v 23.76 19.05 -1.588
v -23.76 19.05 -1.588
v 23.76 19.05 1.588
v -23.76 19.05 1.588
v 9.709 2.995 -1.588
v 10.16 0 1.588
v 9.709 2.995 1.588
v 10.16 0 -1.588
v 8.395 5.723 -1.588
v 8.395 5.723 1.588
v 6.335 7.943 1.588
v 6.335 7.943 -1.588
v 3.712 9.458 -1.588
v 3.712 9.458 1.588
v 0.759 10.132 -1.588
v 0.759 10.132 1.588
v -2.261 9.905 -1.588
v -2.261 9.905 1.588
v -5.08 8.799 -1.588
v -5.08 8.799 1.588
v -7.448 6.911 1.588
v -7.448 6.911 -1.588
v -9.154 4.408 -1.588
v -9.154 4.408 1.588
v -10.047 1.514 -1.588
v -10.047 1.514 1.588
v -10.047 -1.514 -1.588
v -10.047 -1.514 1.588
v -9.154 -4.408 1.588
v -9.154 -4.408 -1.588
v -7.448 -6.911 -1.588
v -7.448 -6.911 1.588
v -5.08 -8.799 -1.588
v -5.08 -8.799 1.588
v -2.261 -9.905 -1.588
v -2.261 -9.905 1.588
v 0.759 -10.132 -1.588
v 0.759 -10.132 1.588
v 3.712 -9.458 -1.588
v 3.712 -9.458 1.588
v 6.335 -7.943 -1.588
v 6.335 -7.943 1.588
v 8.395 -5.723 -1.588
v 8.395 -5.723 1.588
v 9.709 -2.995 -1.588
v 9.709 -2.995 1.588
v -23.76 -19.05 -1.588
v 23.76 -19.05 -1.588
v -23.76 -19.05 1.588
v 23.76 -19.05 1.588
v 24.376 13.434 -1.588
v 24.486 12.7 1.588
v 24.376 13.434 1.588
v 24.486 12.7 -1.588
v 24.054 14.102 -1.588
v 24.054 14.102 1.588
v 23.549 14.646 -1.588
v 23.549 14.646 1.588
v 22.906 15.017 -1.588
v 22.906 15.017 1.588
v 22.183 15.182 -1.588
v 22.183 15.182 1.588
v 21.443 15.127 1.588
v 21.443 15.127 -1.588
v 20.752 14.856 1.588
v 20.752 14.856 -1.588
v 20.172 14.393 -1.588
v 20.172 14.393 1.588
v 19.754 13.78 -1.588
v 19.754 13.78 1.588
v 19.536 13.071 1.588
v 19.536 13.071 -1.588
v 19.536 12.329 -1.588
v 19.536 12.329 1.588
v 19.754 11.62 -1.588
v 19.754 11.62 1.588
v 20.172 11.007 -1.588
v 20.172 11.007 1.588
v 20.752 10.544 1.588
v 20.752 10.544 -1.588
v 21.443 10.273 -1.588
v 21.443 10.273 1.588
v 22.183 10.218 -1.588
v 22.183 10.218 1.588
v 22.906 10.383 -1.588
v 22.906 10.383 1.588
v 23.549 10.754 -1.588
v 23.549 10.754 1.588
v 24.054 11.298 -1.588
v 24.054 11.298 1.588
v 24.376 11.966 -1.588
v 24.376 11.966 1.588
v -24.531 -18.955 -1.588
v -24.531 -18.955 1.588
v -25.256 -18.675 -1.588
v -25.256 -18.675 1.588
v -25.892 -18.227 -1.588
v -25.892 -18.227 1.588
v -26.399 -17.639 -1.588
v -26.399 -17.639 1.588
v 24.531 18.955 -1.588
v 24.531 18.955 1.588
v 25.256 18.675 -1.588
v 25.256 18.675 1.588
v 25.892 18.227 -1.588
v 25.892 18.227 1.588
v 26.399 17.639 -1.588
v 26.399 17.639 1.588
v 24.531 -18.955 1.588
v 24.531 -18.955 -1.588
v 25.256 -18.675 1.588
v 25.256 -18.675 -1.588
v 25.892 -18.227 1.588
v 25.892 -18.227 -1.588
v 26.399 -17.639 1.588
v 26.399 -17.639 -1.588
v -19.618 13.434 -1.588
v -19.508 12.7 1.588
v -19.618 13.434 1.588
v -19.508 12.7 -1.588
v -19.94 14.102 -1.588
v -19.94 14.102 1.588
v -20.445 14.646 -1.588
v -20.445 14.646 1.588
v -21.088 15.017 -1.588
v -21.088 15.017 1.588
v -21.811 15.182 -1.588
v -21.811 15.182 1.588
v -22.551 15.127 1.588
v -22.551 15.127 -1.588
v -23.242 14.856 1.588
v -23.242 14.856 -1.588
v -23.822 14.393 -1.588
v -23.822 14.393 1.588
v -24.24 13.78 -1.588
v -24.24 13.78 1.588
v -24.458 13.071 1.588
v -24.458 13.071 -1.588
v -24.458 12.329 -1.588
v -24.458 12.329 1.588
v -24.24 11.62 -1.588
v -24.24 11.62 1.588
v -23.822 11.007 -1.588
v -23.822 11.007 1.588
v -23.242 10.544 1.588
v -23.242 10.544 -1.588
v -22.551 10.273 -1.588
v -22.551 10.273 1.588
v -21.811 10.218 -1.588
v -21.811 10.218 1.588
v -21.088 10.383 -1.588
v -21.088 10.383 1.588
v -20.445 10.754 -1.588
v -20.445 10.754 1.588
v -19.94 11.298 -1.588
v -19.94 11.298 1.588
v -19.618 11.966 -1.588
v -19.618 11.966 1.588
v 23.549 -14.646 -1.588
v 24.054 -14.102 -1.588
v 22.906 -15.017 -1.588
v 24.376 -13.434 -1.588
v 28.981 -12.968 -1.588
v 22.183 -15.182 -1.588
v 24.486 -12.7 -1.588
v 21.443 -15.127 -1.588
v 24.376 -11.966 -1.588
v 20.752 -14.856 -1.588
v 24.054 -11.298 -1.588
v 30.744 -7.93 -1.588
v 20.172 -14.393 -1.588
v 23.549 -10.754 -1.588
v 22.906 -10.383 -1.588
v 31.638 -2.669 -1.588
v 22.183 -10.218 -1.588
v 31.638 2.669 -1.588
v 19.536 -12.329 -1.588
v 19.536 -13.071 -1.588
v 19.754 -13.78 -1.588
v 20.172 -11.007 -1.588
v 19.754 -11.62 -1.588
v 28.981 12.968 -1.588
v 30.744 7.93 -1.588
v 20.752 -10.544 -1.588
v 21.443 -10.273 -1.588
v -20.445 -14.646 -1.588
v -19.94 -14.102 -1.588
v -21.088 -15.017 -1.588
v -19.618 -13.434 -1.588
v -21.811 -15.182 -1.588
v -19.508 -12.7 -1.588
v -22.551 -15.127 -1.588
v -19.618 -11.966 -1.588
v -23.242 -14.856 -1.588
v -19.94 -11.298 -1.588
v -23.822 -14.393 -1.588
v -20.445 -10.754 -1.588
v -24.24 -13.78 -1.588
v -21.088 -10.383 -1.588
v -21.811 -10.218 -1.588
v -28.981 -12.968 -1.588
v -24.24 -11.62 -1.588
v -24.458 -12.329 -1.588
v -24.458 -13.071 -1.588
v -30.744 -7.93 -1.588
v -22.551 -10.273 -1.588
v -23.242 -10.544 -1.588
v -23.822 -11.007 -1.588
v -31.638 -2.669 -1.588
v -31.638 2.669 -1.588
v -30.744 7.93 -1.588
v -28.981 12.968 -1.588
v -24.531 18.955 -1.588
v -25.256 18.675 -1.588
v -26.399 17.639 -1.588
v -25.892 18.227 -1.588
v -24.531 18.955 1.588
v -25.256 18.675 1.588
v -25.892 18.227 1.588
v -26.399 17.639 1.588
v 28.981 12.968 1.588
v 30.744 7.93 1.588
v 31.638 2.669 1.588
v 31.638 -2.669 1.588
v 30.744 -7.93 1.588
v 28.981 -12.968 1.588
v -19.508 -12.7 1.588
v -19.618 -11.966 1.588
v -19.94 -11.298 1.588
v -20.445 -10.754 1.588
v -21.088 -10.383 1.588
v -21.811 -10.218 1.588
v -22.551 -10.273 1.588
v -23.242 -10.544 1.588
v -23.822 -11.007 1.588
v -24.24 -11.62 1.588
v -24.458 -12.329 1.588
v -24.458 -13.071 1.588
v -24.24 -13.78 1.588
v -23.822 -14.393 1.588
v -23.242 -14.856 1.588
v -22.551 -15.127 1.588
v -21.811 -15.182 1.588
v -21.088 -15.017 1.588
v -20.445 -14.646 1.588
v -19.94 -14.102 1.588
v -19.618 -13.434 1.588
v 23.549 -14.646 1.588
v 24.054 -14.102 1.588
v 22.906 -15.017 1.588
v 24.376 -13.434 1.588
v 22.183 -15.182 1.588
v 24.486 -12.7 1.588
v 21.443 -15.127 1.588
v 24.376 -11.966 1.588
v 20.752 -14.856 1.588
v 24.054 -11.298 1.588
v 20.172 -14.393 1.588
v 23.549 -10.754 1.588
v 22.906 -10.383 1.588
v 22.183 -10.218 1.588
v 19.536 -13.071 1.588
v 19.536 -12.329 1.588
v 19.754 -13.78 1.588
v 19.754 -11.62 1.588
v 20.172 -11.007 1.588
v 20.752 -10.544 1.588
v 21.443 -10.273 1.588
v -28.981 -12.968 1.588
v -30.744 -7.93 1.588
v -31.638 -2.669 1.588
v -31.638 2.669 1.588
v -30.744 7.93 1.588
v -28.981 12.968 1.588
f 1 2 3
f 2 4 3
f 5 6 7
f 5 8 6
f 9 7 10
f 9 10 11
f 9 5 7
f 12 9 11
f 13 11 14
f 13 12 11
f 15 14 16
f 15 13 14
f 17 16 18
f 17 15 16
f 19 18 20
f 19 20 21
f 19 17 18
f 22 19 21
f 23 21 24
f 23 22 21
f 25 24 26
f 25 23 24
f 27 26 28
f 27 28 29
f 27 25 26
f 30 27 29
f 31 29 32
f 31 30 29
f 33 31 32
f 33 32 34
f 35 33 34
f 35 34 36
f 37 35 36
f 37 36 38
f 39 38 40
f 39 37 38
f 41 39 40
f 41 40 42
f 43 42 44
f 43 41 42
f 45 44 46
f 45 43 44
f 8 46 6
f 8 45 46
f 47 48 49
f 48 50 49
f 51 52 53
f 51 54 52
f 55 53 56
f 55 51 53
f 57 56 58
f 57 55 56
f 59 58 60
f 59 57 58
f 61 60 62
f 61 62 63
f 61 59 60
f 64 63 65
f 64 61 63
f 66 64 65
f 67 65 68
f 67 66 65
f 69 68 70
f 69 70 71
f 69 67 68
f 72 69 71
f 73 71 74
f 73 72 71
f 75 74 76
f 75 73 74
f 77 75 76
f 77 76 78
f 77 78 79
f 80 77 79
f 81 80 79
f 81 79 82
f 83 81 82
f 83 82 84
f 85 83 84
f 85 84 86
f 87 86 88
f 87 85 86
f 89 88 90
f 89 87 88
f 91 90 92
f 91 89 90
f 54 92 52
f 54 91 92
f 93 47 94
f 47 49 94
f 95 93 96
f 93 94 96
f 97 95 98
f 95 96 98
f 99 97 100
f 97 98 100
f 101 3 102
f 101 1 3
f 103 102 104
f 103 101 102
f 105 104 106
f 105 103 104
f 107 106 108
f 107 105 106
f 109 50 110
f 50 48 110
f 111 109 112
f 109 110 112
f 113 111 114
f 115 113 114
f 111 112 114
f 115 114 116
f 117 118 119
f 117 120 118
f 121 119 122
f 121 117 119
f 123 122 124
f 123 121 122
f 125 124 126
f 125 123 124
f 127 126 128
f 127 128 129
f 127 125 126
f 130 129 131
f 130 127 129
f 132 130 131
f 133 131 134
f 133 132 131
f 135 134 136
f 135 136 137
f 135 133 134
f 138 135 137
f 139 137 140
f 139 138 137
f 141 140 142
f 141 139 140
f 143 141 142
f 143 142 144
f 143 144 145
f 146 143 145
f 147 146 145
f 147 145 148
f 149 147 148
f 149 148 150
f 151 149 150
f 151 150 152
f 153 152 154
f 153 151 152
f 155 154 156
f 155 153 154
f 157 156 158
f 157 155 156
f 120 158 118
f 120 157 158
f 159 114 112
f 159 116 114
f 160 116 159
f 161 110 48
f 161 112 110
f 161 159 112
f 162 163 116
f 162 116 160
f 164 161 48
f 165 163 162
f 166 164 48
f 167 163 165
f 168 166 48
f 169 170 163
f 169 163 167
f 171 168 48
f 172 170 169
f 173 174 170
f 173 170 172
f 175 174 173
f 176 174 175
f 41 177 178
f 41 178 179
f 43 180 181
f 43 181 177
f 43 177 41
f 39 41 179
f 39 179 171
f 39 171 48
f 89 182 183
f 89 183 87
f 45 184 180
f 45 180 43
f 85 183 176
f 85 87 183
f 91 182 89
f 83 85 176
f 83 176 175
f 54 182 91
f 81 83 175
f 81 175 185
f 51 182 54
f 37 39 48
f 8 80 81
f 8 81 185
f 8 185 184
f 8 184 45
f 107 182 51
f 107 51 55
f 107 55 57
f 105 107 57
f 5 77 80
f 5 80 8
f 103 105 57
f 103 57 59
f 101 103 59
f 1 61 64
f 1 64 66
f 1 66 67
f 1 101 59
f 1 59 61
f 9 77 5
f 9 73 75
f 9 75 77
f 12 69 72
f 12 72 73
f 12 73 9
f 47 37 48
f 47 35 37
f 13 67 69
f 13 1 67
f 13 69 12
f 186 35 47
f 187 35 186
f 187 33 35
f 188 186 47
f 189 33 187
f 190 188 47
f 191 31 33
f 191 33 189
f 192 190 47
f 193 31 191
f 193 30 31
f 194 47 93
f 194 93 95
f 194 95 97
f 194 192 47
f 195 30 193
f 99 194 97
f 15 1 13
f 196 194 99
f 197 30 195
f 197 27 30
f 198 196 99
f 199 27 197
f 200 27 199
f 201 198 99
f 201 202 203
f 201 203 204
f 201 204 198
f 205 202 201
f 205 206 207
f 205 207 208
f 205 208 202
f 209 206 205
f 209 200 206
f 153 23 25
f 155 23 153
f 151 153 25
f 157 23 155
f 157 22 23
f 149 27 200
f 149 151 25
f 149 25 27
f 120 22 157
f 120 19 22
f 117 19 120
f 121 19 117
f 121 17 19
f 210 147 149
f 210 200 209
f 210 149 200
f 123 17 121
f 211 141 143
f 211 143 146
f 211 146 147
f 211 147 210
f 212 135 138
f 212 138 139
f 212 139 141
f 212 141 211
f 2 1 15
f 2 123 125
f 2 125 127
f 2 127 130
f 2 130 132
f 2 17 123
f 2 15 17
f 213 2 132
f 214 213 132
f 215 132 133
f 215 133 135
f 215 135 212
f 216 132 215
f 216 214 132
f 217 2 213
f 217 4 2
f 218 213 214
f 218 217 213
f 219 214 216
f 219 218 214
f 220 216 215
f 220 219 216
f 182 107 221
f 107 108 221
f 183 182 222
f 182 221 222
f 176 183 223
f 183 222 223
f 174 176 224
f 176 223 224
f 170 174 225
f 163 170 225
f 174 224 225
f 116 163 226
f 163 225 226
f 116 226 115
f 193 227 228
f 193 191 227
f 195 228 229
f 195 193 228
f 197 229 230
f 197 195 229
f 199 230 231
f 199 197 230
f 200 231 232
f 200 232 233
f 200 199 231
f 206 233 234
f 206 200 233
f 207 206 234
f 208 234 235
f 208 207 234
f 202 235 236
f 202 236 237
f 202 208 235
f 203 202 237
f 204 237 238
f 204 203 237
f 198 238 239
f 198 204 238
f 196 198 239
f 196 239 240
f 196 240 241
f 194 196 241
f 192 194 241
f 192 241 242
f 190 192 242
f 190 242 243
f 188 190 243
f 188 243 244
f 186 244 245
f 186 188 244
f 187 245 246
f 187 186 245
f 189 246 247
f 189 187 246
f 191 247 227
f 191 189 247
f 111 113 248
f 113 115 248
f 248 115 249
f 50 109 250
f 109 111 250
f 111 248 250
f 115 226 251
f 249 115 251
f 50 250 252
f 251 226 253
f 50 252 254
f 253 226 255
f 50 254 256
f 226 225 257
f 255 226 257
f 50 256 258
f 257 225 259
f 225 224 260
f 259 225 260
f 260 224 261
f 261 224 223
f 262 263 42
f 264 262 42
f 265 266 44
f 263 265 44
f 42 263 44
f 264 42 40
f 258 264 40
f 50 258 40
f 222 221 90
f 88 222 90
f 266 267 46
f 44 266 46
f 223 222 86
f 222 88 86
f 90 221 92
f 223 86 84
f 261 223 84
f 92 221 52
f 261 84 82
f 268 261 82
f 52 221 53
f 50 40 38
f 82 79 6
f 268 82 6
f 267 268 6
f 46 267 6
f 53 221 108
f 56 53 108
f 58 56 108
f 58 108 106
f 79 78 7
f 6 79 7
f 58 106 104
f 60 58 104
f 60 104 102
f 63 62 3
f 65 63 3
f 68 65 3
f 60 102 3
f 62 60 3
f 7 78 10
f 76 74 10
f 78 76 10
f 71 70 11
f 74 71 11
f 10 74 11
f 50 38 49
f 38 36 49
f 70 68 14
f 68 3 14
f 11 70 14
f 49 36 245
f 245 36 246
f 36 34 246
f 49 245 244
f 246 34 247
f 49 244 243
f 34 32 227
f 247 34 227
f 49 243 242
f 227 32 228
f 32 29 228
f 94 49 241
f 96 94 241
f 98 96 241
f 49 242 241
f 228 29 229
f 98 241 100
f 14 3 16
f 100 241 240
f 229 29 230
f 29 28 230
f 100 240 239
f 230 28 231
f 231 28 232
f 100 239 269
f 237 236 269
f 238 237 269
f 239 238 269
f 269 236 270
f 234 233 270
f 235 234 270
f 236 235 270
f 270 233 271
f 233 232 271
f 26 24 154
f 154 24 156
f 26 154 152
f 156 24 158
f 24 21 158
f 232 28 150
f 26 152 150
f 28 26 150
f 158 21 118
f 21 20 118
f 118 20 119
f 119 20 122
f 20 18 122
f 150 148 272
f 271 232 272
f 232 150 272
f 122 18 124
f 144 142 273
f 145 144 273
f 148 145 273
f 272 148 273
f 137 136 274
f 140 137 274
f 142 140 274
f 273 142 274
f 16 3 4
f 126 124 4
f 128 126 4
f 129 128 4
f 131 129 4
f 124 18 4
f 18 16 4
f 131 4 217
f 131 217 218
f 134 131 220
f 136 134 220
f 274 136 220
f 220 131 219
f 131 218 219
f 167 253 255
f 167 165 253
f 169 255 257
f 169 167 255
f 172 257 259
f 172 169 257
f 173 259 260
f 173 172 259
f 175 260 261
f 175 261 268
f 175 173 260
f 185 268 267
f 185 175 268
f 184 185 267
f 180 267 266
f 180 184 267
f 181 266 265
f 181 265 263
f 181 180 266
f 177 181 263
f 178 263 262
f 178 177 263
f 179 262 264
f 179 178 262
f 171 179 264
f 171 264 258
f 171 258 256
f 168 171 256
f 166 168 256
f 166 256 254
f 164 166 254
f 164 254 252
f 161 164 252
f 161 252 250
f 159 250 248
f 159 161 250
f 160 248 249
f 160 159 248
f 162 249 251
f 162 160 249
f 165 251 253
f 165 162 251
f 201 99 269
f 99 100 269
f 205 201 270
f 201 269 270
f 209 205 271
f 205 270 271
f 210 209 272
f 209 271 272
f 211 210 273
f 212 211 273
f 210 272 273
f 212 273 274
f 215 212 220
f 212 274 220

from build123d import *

# Parameters (mm, degrees)
SKETCH1_R           = 2.4892
SKETCH1_R_2         = 10.16
BOSS_EXTRUDE1_DEPTH = 1.5875
FILLET1_R           = 3.175


with BuildPart() as part:
    # Sketch1 → Boss-Extrude1 (new, symmetric)
    with BuildSketch(Plane.XY):
        with BuildLine():
            Line((-25.4, 19.05), (0, 19.05))
            Line((0, 19.05), (25.4, 19.05))
            ThreePointArc((25.4, 19.05), (31.75, 0), (25.4, -19.05))
            Line((25.4, -19.05), (0, -19.05))
            Line((0, -19.05), (-25.4, -19.05))
            ThreePointArc((-25.4, -19.05), (-31.75, 0), (-25.4, 19.05))
        make_face()
        with Locations((21.997045256, 12.7)):
            Circle(SKETCH1_R, mode=Mode.SUBTRACT)
        with Locations((21.997045256, -12.7)):
            Circle(SKETCH1_R, mode=Mode.SUBTRACT)
        with Locations((-21.997045256, -12.7)):
            Circle(SKETCH1_R, mode=Mode.SUBTRACT)
        with Locations((-21.997045256, 12.7)):
            Circle(SKETCH1_R, mode=Mode.SUBTRACT)
        Circle(SKETCH1_R_2, mode=Mode.SUBTRACT)
    extrude(amount=BOSS_EXTRUDE1_DEPTH, both=True)

    # Fillet1
    fillet1_edges = [part.edges().sort_by_distance(p)[0] for p in [
        (-25.4, 19.05, 0),
        (25.4, 19.05, 0),
        (25.4, -19.05, 0),
        (-25.4, -19.05, 0),
    ]]
    fillet(fillet1_edges, radius=FILLET1_R)


solid = part.part
